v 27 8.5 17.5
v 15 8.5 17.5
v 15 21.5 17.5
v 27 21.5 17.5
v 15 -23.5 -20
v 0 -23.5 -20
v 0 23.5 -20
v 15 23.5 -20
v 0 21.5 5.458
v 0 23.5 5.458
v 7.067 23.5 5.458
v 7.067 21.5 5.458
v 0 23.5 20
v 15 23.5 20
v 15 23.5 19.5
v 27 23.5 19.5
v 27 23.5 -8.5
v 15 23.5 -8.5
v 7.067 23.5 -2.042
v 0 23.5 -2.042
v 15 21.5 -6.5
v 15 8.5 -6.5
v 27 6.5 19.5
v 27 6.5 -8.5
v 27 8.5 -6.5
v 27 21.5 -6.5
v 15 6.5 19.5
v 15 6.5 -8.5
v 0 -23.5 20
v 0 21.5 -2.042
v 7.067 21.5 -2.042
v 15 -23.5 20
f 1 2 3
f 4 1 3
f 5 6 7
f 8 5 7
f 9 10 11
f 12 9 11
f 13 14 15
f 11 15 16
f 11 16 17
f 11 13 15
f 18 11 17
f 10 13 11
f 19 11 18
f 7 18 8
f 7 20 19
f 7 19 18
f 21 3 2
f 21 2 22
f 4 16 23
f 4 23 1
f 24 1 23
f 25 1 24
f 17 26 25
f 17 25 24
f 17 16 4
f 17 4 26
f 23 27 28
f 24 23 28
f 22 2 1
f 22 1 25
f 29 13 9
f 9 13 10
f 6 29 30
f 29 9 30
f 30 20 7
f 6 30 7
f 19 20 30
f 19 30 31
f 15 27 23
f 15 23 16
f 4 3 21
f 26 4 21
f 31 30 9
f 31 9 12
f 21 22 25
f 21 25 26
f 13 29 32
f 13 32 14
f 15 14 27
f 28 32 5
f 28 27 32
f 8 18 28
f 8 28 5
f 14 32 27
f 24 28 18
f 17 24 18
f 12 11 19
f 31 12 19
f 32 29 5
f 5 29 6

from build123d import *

# Parameters (mm, degrees)
SKETCH1_W           = 40
SKETCH1_H           = 47
BOSS_EXTRUDE1_DEPTH = 15
SKETCH2_W           = 28
SKETCH2_H           = 17
SKETCH2_W_2         = 24
SKETCH2_H_2         = 13
BOSS_EXTRUDE2_DEPTH = 12
SKETCH4_W           = 7.067405003
SKETCH4_H           = 7.5
CUT_EXTRUDE1_DEPTH  = 2


with BuildPart() as part:
    # Sketch1 → Boss-Extrude1 (new body)
    with BuildSketch(Plane(origin=(0, 0, 0), x_dir=(0, 0, -1), z_dir=(1, 0, 0))):
        Rectangle(SKETCH1_W, SKETCH1_H)
    extrude(amount=BOSS_EXTRUDE1_DEPTH)

    # Sketch2 → Boss-Extrude2 (add)
    with BuildSketch(Plane(origin=(15, 0, 0), x_dir=(0, 0, -1), z_dir=(1, 0, 0))):
        with Locations((-5.5, 15)):
            Rectangle(SKETCH2_W, SKETCH2_H)
        with Locations((-5.5, 15)):
            Rectangle(SKETCH2_W_2, SKETCH2_H_2, mode=Mode.SUBTRACT)
    extrude(amount=BOSS_EXTRUDE2_DEPTH)

    # Sketch4 → Cut-Extrude1 (cut)
    with BuildSketch(Plane(origin=(0, 23.5, 0), x_dir=(1, 0, 0), z_dir=(0, 1, 0))):
        with Locations((3.533702502, -1.707739217)):
            Rectangle(SKETCH4_W, SKETCH4_H)
    extrude(amount=-CUT_EXTRUDE1_DEPTH, mode=Mode.SUBTRACT)


solid = part.part
